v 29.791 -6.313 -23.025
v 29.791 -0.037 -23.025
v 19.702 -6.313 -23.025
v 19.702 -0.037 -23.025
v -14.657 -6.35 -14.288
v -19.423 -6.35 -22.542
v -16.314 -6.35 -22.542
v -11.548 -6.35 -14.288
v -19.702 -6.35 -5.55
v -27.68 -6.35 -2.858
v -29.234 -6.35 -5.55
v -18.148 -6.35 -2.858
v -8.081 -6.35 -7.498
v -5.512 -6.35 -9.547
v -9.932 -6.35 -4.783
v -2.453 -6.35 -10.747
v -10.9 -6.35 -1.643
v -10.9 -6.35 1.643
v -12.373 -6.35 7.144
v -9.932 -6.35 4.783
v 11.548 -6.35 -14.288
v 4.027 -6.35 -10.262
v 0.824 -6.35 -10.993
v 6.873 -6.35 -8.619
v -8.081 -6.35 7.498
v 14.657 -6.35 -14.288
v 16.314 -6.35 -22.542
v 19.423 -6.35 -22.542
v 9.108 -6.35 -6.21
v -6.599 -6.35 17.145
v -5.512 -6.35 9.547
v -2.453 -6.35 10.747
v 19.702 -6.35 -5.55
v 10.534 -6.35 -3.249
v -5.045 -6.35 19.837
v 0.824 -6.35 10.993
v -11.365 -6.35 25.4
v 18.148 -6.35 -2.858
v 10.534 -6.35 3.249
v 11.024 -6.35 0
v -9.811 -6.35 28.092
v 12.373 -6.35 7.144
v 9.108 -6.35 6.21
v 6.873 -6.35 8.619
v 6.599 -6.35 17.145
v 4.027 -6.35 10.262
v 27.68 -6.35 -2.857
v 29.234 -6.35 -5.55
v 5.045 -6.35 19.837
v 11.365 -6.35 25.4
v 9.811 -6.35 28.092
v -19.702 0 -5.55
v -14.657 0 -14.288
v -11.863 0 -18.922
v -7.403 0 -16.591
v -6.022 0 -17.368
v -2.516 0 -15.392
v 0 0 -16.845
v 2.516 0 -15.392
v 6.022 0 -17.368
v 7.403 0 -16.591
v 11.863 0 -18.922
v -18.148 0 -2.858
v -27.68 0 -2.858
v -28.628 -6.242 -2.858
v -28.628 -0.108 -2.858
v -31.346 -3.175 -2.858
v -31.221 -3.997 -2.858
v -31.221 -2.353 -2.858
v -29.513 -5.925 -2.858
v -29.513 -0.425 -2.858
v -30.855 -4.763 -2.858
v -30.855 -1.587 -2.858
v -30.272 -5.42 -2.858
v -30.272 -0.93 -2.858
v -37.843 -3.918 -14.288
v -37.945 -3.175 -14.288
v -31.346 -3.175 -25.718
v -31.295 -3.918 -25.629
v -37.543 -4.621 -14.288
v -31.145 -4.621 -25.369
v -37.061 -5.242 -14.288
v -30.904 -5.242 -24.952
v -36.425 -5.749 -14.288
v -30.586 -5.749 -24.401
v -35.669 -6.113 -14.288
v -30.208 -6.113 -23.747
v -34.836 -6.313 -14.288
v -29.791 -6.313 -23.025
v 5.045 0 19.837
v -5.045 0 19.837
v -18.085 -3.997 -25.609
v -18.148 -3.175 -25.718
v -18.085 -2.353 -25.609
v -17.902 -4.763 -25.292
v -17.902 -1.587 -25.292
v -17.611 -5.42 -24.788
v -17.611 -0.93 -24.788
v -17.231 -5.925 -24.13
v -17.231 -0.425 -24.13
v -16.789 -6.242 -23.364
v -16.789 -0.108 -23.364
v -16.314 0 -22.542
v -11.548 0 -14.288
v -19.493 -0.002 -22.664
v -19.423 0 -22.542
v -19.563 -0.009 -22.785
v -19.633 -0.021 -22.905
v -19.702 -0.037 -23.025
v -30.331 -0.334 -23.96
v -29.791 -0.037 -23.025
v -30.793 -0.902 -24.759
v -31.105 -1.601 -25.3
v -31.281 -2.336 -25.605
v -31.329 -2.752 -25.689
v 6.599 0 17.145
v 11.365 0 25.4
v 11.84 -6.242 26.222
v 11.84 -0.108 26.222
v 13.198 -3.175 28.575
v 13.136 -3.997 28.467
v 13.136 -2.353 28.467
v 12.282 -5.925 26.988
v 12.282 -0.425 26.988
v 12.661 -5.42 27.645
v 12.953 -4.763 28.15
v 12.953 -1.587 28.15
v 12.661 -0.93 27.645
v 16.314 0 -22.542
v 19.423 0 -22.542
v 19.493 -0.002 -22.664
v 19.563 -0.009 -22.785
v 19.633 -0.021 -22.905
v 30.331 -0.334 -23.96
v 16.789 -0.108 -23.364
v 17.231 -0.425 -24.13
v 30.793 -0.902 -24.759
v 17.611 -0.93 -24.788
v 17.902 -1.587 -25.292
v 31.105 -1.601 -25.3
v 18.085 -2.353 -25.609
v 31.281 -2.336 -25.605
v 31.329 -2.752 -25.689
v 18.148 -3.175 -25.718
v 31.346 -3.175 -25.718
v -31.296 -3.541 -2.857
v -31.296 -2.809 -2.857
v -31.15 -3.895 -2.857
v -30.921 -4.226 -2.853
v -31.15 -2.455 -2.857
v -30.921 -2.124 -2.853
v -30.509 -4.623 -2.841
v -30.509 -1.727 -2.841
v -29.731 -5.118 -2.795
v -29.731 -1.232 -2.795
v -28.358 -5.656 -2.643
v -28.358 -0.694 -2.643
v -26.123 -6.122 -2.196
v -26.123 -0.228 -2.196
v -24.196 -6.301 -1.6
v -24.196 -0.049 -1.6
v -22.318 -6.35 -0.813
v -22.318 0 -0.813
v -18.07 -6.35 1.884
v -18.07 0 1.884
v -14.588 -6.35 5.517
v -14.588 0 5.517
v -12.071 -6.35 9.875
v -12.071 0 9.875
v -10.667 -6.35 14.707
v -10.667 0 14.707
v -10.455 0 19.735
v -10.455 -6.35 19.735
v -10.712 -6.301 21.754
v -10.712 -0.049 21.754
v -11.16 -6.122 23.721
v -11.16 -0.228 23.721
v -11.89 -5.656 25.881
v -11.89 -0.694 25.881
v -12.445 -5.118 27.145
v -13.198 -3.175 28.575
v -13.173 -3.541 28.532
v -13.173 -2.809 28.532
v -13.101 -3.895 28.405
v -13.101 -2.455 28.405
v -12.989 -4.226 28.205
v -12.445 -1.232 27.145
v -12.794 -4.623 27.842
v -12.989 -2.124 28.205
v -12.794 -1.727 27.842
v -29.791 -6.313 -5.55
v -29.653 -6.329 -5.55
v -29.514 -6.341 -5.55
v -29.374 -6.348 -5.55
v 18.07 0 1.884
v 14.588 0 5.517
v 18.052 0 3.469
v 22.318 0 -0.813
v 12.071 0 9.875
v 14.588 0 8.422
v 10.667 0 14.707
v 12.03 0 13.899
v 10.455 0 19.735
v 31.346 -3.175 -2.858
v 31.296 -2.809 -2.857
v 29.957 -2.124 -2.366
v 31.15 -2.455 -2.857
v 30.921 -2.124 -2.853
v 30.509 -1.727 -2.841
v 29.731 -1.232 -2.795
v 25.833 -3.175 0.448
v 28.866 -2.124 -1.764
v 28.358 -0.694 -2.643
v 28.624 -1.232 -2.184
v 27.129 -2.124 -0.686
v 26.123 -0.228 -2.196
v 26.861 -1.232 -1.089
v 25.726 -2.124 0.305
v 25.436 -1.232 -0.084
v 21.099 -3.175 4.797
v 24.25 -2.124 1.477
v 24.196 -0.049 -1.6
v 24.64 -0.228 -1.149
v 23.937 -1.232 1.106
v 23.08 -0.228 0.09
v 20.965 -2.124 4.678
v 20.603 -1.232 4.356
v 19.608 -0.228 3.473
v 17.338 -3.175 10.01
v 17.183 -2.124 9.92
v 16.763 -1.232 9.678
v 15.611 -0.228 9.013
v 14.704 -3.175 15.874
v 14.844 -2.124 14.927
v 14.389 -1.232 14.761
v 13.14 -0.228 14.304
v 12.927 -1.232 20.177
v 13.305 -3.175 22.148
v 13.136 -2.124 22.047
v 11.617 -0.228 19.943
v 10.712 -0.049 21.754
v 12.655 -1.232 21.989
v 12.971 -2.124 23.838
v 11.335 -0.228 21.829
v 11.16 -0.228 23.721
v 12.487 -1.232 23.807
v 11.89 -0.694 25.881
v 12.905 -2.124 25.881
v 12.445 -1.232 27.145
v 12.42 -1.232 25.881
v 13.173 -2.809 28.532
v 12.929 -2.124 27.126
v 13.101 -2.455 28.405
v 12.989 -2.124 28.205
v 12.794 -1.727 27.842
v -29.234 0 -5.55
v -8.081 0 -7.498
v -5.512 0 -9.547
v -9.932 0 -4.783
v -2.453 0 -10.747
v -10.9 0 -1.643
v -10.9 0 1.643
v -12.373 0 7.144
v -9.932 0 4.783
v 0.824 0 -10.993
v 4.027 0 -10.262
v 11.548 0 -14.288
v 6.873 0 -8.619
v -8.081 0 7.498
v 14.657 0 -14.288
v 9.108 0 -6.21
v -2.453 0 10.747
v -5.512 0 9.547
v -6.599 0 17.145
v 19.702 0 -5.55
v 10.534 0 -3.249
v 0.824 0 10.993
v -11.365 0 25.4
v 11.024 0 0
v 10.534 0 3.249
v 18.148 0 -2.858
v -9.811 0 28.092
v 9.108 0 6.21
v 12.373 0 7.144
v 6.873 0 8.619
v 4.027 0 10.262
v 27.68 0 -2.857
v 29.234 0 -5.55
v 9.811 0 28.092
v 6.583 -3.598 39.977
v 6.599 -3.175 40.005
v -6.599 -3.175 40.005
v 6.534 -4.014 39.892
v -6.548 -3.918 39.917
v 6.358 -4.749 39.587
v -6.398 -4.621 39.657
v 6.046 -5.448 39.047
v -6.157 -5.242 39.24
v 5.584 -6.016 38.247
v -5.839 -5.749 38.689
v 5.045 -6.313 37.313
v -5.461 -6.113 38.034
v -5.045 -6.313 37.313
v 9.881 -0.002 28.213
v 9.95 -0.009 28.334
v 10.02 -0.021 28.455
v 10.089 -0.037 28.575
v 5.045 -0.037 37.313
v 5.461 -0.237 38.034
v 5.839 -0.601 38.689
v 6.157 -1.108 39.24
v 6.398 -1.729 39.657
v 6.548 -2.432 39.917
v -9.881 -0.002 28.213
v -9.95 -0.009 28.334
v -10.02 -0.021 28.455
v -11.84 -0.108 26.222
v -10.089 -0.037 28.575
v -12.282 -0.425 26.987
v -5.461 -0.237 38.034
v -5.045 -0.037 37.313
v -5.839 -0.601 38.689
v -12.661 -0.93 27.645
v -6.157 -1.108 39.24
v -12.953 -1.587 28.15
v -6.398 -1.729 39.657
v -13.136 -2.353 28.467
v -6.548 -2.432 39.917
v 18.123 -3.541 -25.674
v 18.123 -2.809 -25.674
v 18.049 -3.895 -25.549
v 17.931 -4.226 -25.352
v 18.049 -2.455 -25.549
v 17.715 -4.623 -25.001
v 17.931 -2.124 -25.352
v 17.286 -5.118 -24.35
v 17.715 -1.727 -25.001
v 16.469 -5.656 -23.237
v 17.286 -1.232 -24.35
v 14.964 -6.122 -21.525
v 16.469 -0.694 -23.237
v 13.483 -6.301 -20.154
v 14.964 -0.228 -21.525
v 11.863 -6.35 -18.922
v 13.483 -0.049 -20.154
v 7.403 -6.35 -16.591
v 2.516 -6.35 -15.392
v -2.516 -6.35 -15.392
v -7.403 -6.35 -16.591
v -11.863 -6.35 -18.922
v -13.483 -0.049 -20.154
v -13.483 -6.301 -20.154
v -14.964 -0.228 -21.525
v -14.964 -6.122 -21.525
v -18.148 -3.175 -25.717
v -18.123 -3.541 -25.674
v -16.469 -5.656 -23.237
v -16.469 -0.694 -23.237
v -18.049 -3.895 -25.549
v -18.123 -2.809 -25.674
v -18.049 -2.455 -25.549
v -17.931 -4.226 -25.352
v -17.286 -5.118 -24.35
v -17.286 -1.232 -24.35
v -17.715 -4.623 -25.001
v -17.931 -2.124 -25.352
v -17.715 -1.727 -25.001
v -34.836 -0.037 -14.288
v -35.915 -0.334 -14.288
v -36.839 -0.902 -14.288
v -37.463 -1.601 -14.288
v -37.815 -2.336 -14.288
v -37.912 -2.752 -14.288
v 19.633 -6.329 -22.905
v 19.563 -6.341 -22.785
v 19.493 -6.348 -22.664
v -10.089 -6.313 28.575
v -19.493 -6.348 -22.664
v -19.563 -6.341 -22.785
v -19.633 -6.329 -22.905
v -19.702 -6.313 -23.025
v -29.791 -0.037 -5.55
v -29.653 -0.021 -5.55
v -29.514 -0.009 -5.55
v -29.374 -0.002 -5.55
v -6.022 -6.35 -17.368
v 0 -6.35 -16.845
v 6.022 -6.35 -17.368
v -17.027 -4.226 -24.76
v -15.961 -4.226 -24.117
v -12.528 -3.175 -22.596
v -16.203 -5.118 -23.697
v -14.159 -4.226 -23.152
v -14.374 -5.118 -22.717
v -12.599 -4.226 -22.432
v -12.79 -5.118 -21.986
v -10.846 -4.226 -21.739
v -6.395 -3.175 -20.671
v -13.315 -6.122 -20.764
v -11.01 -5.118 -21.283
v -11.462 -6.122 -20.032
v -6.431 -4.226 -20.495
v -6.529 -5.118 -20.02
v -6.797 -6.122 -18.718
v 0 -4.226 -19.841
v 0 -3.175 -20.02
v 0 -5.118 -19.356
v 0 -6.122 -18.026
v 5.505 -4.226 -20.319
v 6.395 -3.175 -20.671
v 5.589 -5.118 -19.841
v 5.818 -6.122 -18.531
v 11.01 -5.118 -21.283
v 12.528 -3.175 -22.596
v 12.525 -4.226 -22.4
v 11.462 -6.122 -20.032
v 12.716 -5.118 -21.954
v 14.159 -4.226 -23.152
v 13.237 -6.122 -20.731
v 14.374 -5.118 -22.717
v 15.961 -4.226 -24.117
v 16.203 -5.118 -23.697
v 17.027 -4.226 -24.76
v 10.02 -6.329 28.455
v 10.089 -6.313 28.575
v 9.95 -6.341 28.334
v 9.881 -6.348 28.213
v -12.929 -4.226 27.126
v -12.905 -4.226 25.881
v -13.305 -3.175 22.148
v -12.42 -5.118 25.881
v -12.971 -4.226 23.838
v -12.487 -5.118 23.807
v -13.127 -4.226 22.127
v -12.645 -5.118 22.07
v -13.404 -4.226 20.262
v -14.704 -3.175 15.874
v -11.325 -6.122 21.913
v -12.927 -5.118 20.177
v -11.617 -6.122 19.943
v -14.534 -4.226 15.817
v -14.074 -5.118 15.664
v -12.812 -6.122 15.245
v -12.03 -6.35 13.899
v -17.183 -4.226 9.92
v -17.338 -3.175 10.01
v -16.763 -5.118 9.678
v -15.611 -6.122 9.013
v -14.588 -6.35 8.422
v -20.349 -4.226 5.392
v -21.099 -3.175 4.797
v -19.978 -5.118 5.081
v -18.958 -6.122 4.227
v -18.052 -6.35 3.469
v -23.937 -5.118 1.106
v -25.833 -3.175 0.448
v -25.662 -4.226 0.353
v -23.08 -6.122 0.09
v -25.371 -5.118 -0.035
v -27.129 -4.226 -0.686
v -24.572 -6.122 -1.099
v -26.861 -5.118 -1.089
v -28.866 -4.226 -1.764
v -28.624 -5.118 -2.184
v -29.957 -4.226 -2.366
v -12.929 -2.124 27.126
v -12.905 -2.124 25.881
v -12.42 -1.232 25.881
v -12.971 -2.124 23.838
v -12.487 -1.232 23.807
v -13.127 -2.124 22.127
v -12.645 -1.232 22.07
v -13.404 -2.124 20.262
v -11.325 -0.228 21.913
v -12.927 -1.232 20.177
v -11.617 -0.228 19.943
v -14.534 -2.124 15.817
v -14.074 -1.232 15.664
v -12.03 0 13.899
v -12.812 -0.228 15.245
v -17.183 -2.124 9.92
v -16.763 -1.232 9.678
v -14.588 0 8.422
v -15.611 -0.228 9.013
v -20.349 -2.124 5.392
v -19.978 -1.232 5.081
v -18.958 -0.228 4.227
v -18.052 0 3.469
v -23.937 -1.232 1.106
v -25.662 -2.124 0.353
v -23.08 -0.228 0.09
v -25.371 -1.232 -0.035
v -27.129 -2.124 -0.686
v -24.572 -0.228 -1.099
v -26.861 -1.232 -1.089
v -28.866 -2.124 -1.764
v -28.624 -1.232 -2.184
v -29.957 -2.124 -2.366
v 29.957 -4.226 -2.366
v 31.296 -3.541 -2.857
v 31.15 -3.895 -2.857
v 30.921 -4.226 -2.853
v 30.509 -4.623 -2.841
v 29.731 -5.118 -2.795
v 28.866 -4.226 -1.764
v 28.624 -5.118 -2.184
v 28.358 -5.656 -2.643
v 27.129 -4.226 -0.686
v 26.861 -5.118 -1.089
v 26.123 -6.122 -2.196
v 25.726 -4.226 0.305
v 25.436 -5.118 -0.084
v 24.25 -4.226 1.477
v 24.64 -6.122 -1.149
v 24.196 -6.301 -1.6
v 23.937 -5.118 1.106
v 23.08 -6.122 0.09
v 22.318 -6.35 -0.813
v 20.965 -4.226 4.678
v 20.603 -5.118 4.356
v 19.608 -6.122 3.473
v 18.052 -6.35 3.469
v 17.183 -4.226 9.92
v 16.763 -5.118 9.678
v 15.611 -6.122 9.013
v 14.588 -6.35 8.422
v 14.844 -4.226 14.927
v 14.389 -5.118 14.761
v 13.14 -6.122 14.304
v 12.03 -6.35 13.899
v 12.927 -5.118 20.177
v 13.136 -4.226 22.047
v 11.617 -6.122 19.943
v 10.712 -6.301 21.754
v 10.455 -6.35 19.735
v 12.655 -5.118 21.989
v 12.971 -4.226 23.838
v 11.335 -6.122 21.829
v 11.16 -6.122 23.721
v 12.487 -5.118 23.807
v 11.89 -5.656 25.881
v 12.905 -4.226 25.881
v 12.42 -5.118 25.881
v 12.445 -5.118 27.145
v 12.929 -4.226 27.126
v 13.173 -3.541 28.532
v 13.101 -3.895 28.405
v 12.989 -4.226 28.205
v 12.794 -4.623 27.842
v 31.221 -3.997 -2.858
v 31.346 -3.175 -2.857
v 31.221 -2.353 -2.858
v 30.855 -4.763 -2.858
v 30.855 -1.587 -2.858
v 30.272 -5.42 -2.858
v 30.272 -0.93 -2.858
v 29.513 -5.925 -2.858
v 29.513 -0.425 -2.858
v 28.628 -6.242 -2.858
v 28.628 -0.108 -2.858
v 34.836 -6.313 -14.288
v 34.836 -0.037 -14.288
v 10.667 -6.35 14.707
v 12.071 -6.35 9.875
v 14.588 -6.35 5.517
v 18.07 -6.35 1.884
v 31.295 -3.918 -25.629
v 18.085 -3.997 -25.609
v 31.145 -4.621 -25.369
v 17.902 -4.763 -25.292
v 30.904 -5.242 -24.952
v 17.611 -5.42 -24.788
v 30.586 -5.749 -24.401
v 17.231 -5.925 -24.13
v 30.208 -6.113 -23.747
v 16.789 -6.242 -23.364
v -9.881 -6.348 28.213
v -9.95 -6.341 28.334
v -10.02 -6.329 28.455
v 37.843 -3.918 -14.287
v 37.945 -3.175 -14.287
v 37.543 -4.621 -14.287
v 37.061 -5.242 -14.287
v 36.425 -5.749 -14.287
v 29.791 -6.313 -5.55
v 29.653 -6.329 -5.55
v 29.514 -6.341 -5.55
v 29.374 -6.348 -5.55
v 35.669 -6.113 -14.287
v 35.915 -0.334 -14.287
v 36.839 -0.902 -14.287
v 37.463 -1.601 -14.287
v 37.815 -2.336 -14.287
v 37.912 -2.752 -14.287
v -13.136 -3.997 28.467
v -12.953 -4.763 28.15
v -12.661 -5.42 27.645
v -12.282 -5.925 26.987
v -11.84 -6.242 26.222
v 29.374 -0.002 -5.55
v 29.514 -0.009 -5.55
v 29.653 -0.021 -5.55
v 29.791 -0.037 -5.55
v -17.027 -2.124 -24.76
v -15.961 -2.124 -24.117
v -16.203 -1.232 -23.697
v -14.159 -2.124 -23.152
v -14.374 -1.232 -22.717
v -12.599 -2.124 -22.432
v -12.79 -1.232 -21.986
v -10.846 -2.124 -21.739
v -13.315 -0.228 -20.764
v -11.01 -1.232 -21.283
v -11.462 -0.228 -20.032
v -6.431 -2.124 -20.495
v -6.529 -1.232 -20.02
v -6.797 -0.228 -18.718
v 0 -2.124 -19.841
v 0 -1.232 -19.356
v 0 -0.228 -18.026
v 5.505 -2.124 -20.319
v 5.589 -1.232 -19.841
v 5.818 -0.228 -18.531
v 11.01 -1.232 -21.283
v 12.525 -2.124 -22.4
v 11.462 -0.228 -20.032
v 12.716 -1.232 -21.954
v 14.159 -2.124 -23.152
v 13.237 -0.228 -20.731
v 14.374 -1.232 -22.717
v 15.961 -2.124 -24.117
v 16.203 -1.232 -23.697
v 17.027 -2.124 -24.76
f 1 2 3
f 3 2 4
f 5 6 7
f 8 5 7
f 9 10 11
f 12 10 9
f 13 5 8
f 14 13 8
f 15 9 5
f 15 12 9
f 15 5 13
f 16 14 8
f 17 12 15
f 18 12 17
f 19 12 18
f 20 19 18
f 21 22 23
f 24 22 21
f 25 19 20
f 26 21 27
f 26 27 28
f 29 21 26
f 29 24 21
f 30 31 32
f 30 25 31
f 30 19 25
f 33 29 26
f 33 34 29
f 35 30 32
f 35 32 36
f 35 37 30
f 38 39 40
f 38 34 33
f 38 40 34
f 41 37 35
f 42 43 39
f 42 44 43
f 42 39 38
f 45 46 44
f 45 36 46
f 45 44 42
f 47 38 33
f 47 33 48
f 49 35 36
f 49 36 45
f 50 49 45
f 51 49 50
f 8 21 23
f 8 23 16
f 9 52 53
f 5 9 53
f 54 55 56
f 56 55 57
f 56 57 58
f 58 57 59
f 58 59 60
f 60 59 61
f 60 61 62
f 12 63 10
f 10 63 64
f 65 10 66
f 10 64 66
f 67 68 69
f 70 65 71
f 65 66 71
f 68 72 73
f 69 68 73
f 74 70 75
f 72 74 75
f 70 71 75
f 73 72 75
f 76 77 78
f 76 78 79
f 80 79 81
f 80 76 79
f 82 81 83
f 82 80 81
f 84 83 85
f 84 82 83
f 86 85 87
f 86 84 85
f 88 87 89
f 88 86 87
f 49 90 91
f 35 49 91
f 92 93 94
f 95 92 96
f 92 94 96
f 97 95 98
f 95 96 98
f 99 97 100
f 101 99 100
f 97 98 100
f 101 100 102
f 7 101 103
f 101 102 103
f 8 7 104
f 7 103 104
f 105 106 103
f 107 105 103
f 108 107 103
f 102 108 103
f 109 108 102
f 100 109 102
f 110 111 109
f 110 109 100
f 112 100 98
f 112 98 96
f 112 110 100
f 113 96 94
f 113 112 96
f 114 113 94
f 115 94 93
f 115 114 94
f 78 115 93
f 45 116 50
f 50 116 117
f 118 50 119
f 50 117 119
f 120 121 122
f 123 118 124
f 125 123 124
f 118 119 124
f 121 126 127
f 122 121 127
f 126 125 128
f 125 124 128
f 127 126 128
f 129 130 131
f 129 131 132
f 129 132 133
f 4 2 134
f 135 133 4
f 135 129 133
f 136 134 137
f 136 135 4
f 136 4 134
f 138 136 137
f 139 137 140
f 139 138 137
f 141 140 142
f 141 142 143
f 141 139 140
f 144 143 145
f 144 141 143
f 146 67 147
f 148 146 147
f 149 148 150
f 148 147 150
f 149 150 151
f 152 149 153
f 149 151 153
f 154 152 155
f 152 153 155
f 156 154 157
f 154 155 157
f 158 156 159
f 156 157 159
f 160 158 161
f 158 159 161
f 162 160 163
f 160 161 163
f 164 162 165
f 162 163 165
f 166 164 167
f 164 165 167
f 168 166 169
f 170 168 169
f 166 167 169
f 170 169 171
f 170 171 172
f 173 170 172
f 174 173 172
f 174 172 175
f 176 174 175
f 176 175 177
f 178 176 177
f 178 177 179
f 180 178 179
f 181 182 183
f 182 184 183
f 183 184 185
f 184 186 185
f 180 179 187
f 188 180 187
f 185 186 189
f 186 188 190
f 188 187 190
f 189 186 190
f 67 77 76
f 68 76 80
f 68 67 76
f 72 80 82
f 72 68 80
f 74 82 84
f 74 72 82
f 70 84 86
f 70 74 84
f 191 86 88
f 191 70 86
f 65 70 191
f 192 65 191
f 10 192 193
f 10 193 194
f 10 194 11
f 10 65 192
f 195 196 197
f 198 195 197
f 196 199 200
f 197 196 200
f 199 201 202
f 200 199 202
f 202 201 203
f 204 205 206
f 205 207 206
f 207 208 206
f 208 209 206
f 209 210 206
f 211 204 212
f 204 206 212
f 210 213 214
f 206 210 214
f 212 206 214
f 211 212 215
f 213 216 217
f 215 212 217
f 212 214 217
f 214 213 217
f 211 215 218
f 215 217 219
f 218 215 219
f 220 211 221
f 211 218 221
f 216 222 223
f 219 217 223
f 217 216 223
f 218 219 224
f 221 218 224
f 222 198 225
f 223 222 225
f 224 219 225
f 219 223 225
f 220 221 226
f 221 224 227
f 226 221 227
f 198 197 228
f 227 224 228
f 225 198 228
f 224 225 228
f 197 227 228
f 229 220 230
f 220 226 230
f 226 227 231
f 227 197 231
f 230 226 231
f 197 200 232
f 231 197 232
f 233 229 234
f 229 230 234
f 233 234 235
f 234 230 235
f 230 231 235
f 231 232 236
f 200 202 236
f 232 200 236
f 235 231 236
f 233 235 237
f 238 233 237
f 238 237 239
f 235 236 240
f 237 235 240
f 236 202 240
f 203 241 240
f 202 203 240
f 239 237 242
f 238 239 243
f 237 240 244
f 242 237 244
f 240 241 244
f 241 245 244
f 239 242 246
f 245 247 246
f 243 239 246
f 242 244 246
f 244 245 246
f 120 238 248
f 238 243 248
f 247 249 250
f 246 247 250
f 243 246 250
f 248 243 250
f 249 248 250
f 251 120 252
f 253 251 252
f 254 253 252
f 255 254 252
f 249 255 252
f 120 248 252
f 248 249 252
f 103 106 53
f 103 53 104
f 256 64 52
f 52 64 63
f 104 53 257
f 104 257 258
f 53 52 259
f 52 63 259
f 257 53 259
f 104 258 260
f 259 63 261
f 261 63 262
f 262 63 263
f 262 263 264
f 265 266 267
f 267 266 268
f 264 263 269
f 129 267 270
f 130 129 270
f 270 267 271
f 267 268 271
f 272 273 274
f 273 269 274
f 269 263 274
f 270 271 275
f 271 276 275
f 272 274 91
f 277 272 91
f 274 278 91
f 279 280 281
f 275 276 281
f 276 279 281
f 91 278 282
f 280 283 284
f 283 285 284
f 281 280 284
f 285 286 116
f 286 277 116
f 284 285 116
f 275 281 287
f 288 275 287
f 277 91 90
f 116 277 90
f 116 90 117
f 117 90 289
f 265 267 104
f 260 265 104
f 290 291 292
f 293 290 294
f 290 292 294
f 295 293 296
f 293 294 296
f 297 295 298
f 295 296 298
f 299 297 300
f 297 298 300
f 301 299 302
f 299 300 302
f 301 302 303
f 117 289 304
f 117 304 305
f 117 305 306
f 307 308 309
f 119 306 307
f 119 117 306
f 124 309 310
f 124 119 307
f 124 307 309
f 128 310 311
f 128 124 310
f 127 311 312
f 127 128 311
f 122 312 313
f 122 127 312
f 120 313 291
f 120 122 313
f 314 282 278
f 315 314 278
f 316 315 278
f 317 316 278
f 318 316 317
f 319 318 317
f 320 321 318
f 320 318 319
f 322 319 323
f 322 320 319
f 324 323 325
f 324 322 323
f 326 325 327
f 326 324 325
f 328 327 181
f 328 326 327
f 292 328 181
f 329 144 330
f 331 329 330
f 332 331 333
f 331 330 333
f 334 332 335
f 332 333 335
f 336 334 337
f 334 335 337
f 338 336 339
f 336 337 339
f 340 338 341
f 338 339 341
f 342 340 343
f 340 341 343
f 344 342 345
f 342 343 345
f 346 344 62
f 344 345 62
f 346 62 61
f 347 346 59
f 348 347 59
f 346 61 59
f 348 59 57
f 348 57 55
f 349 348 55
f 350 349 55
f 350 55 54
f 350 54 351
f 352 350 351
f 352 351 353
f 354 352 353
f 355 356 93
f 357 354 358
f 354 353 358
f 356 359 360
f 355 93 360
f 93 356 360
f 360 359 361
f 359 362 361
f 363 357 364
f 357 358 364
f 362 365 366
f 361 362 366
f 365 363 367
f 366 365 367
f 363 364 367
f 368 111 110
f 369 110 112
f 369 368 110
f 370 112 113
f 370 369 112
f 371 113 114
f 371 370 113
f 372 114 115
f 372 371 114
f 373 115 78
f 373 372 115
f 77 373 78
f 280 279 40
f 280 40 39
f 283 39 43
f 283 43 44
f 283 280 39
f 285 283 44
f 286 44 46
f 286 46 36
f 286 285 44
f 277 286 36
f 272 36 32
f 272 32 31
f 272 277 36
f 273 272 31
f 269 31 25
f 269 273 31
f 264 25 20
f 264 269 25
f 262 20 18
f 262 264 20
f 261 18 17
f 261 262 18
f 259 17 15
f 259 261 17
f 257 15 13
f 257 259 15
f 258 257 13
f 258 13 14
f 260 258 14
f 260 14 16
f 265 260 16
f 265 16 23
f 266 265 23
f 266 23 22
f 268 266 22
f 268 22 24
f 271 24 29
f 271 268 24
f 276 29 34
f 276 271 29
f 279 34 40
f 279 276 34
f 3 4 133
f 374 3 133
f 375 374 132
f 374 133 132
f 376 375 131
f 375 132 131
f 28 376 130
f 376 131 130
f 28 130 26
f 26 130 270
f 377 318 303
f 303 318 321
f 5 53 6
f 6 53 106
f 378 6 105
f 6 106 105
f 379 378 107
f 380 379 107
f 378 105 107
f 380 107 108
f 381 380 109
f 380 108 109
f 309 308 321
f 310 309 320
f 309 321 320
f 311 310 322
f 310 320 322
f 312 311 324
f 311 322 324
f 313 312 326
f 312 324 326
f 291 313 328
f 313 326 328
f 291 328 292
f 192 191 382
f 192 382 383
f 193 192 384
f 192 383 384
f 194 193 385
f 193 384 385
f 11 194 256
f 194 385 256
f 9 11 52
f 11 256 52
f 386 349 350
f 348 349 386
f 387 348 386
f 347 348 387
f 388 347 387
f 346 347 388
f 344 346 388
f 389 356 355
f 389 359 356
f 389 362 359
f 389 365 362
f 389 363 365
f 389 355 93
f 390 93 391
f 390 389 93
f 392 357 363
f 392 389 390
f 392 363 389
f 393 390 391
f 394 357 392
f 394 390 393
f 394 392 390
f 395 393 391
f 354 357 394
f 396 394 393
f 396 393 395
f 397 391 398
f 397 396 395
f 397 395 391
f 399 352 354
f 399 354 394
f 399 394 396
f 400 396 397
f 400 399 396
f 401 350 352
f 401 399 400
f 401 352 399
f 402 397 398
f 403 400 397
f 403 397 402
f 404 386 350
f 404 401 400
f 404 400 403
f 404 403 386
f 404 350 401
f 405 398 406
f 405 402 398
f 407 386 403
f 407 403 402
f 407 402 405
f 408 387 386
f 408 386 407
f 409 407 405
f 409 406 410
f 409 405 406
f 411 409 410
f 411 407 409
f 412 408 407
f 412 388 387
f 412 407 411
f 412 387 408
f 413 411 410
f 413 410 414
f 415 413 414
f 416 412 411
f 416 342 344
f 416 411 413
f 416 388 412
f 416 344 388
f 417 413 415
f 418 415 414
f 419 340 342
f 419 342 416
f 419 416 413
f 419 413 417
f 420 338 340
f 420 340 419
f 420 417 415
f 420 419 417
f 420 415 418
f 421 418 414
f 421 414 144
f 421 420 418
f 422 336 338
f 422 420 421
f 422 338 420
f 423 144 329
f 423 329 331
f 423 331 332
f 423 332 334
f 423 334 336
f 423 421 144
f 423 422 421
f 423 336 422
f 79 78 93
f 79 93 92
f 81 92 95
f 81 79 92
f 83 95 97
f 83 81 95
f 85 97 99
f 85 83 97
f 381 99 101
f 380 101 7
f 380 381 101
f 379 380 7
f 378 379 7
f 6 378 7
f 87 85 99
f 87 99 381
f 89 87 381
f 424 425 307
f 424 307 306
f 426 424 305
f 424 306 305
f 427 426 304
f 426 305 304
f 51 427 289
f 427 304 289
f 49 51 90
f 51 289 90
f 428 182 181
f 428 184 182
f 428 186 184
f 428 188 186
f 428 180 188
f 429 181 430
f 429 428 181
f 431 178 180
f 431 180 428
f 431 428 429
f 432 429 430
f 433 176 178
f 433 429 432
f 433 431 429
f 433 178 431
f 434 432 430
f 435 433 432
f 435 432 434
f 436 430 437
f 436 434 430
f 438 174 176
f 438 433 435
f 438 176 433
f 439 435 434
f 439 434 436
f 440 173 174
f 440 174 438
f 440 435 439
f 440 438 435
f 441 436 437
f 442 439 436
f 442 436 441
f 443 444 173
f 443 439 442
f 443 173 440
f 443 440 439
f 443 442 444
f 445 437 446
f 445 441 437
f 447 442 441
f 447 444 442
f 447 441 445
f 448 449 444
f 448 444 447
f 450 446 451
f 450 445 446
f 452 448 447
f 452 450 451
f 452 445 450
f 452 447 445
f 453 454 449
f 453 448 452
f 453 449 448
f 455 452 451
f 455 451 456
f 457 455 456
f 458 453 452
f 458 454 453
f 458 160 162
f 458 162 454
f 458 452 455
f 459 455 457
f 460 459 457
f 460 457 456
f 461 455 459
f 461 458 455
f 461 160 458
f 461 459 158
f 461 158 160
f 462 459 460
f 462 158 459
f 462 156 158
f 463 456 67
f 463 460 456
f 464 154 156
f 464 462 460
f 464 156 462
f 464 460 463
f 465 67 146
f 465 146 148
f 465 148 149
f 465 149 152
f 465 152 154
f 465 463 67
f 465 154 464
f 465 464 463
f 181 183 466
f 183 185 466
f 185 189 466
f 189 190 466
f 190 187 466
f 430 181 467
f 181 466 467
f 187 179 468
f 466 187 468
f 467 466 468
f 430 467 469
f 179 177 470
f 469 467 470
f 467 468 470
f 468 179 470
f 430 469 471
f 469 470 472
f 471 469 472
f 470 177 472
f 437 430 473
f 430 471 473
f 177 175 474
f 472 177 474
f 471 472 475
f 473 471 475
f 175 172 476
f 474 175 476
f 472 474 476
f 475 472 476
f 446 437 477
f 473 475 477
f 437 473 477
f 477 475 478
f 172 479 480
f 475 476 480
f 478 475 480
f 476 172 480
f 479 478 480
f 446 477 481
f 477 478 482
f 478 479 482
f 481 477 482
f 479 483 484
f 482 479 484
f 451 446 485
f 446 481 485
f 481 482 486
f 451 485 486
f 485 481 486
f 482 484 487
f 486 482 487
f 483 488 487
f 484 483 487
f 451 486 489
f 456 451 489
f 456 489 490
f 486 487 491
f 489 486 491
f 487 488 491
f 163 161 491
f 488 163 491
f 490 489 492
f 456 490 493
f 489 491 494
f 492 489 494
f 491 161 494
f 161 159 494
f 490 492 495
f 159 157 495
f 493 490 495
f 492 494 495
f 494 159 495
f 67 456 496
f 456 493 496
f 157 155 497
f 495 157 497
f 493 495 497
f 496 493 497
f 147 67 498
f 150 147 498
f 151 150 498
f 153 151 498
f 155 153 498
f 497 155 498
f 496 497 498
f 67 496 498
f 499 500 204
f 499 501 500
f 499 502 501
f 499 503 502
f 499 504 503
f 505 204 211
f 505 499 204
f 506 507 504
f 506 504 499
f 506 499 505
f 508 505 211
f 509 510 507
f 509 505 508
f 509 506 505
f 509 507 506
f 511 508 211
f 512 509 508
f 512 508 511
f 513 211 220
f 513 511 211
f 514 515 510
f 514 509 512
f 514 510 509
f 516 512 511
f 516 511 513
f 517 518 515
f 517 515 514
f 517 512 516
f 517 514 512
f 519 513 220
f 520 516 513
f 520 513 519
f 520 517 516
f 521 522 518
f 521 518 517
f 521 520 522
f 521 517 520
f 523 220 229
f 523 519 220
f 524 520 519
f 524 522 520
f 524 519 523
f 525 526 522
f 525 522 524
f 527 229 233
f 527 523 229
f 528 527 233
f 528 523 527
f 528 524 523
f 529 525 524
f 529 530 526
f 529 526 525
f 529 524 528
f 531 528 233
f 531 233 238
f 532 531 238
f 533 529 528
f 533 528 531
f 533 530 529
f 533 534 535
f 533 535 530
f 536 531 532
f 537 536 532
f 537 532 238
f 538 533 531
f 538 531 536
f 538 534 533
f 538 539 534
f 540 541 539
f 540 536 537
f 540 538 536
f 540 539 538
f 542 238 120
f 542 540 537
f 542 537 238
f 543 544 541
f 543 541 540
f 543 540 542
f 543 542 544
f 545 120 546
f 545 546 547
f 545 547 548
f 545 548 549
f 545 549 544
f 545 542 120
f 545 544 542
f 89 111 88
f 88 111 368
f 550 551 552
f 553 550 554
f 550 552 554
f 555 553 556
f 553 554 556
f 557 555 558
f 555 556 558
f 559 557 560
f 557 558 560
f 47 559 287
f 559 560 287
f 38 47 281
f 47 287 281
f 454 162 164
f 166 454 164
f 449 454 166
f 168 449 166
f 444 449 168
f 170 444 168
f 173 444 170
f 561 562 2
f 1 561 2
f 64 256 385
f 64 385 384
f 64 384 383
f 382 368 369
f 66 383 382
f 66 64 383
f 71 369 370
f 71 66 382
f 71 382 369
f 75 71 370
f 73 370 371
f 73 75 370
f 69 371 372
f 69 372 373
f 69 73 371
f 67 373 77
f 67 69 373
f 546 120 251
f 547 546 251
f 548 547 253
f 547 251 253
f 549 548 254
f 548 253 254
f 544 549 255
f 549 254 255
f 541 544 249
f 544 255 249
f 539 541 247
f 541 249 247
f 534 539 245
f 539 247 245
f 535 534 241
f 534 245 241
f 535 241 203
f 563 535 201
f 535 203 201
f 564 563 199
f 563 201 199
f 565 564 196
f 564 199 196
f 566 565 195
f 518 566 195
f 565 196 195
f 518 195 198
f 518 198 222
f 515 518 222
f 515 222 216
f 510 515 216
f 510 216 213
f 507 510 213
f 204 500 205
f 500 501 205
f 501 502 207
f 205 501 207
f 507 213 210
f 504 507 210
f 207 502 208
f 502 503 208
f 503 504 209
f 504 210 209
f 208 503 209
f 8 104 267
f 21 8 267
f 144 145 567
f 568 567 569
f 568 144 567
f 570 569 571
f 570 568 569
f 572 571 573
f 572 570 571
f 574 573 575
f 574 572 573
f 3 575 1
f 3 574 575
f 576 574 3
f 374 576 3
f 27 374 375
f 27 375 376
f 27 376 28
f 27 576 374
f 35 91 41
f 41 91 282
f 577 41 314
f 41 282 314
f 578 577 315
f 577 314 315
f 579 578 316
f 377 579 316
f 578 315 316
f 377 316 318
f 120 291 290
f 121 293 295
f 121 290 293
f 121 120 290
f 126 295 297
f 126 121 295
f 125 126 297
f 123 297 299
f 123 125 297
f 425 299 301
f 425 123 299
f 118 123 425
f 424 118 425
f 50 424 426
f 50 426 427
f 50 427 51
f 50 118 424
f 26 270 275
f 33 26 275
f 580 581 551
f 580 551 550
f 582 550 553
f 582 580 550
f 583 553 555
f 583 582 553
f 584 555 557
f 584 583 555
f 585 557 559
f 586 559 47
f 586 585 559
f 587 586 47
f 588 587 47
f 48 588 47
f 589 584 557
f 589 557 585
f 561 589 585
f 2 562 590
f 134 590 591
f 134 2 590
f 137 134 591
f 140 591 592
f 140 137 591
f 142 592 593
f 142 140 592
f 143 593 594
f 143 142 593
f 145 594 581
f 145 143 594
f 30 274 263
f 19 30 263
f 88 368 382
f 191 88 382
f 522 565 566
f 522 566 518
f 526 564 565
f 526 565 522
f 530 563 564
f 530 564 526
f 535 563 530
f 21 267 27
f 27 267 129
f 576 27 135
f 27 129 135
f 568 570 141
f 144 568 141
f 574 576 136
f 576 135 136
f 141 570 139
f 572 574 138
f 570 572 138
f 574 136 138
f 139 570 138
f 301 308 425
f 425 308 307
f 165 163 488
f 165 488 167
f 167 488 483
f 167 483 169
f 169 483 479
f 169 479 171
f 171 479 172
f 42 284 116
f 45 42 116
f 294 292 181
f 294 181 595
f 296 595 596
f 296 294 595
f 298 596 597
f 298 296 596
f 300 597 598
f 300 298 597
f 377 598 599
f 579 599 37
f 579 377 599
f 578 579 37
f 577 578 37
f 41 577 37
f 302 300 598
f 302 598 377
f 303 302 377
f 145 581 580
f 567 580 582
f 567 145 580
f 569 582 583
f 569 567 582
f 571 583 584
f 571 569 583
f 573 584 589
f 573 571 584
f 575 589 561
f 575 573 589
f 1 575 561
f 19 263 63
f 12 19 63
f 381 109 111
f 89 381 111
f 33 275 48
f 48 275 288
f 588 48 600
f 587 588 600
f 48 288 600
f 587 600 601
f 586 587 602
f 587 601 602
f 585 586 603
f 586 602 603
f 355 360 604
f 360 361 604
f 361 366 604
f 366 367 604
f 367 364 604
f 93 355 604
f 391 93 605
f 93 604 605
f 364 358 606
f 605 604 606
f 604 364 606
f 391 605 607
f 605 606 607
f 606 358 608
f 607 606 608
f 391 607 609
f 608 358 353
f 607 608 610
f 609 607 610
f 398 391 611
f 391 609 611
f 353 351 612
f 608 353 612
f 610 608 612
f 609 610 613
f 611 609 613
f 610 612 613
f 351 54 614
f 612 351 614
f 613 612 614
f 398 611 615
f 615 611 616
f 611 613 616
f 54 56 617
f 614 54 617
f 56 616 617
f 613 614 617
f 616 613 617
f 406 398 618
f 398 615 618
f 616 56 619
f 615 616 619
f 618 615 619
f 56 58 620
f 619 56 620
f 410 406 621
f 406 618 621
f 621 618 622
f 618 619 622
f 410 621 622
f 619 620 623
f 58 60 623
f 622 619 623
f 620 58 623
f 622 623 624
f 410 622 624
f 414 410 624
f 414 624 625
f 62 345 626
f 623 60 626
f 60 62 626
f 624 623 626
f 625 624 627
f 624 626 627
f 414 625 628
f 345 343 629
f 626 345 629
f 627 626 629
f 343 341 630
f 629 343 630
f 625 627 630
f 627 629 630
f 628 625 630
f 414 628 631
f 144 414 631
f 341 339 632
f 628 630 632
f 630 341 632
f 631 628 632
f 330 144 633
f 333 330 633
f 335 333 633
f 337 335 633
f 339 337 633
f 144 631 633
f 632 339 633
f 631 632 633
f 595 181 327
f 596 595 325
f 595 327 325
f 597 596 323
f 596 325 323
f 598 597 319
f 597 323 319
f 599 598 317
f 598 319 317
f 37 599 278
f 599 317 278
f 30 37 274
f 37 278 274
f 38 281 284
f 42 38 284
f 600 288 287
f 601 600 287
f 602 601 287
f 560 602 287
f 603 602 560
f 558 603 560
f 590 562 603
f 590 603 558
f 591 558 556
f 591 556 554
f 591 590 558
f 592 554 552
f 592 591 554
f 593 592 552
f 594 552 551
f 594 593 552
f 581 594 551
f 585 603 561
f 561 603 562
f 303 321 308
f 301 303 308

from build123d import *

# Parameters (mm, degrees)
F1_DEPTH      = 6.35
F0_R          = 11.0236
F2_T1_DEPTH   = 29.0732271537
F2_T3_DEPTH   = 29.0732271537
F2_T5_DEPTH   = 29.0732271537
F2_T7_DEPTH   = 29.0732271537
F2_T9_DEPTH   = 29.0732271537
F2_T11_DEPTH  = 29.0732271537
F2_T13_DEPTH  = 29.0732271537
F2_T15_DEPTH  = 29.0732271537
F2_T17_DEPTH  = 29.0732271537
F2_2_T2_ANGLE = 98.3752988321
F2_3_T2_ANGLE = 98.3752988321
F2_4_T2_ANGLE = 98.3752988321
F3_T1_DEPTH   = 29.0732271537
F3_T3_DEPTH   = 29.0732271537
F3_T5_DEPTH   = 29.0732271537
F3_T7_DEPTH   = 29.0732271537
F3_T9_DEPTH   = 29.0732271537
F3_T11_DEPTH  = 29.0732271537
F3_T13_DEPTH  = 29.0732271537
F3_T15_DEPTH  = 29.0732271537
F3_T17_DEPTH  = 29.0732271537
F3_2_T2_ANGLE = 98.3752988321
F3_3_T2_ANGLE = 98.3752988321
F3_4_T2_ANGLE = 98.3752988321


# Not quite as in the source:
# - a fillet or chamfer that OpenCascade refuses, or shapes differently, is made with other operations: its cross-section is extruded or revolved along the edge and cut away or added


with BuildPart() as f1:
    # F0 (on Front) → F1 (new body)
    with BuildSketch(Plane.XZ):
        with BuildLine():
            ThreePointArc((-31.34578949, -2.8575), (-13.1982271537, 7.62), (-13.1982271537, 28.575))
            ThreePointArc((-13.1982271537, 28.575), (-17.3377575298, 10.009958977), (-31.34578949, -2.8575))
        make_face()
    extrude(amount=F1_DEPTH)

    # F2#2: fillet of radius 3.175 on 1 edges, made by hand

    # F2_2_s1 → F2_2_t2 (revolve, cut)
    with BuildSketch(Plane(origin=(-12.8777682078, 0, 37.0055953838), x_dir=(0, 1, 0), z_dir=(-0.3286630709, 0, 0.9444472382))):
        with BuildLine():
            ThreePointArc((-3.175, 2.0859779117), (-5.4200640303, 1.156041942), (-6.35, -1.0890220883))
            Line((-6.35, -1.0890220883), (-6.35, 2.0859779117))
            Line((-6.35, 2.0859779117), (-3.175, 2.0859779117))
        make_face()
    revolve(axis=Axis((-44.8340641, -6.35, 25.884958977), (0, 1, 0)), revolution_arc=F2_2_T2_ANGLE, mode=Mode.SUBTRACT)

    # F3#4: fillet of radius 3.175 on 1 edges, made by hand

    # F3_4_s1 → F3_4_t2 (revolve, cut)
    with BuildSketch(Plane(origin=(-12.8777682078, 0, 37.0055953838), x_dir=(0, 1, 0), z_dir=(-0.3286630709, 0, 0.9444472382))):
        with BuildLine():
            ThreePointArc((-3.175, 2.0859779117), (-0.9299359697, 1.156041942), (0, -1.0890220883))
            Line((0, -1.0890220883), (0, 2.0859779117))
            Line((0, 2.0859779117), (-3.175, 2.0859779117))
        make_face()
    revolve(axis=Axis((-44.8340641, 0, 25.884958977), (0, 1, 0)), revolution_arc=F3_4_T2_ANGLE, mode=Mode.SUBTRACT)


with BuildPart() as f1b:
    # F0 (on Front) → F1, piece 2 (new body)
    with BuildSketch(Plane.XZ):
        with BuildLine():
            ThreePointArc((13.1982271537, 28.575), (13.1982271537, 7.62), (31.34578949, -2.8575))
            ThreePointArc((31.34578949, -2.8575), (17.3377575298, 10.009958977), (13.1982271537, 28.575))
        make_face()
    extrude(amount=F1_DEPTH)

    # F2#4: fillet of radius 3.175 on 1 edges, made by hand

    # F2_4_s1 → F2_4_t2 (revolve, cut)
    with BuildSketch(Plane(origin=(38.4866697884, 0, -7.3503232799), x_dir=(0, 1, 0), z_dir=(0.9822468363, 0, -0.1875930505))):
        with BuildLine():
            ThreePointArc((-3.175, 2.0859779117), (-5.4200640303, 1.156041942), (-6.35, -1.0890220883))
            Line((-6.35, -1.0890220883), (-6.35, 2.0859779117))
            Line((-6.35, 2.0859779117), (-3.175, 2.0859779117))
        make_face()
    revolve(axis=Axis((44.8340641, -6.35, 25.884958977), (0, 1, 0)), revolution_arc=F2_4_T2_ANGLE, mode=Mode.SUBTRACT)

    # F3#2: fillet of radius 3.175 on 1 edges, made by hand

    # F3_2_s1 → F3_2_t2 (revolve, cut)
    with BuildSketch(Plane(origin=(38.4866697884, 0, -7.3503232799), x_dir=(0, 1, 0), z_dir=(0.9822468363, 0, -0.1875930505))):
        with BuildLine():
            ThreePointArc((-3.175, 2.0859779117), (-0.9299359697, 1.156041942), (0, -1.0890220883))
            Line((0, -1.0890220883), (0, 2.0859779117))
            Line((0, 2.0859779117), (-3.175, 2.0859779117))
        make_face()
    revolve(axis=Axis((44.8340641, 0, 25.884958977), (0, 1, 0)), revolution_arc=F3_2_T2_ANGLE, mode=Mode.SUBTRACT)


with BuildPart() as f1c:
    # F0 (on Front) → F1, piece 3 (new body)
    with BuildSketch(Plane.XZ):
        with BuildLine():
            ThreePointArc((18.1475623363, -25.7175), (0, -15.24), (-18.1475623363, -25.7175))
            ThreePointArc((-18.1475623363, -25.7175), (0, -20.019917954), (18.1475623363, -25.7175))
        make_face()
    extrude(amount=F1_DEPTH)

    # F2#3: fillet of radius 3.175 on 1 edges, made by hand

    # F2_3_s1 → F2_3_t2 (revolve, cut)
    with BuildSketch(Plane(origin=(-25.6089015806, 0, -29.6552721039), x_dir=(0, 1, 0), z_dir=(-0.6535837654, 0, -0.7568541878))):
        with BuildLine():
            ThreePointArc((-3.175, 2.0859779117), (-5.4200640303, 1.156041942), (-6.35, -1.0890220883))
            Line((-6.35, -1.0890220883), (-6.35, 2.0859779117))
            Line((-6.35, 2.0859779117), (-3.175, 2.0859779117))
        make_face()
    revolve(axis=Axis((0, -6.35, -51.769917954), (0, 1, 0)), revolution_arc=F2_3_T2_ANGLE, mode=Mode.SUBTRACT)

    # F3#3: fillet of radius 3.175 on 1 edges, made by hand

    # F3_3_s1 → F3_3_t2 (revolve, cut)
    with BuildSketch(Plane(origin=(-25.6089015806, 0, -29.6552721039), x_dir=(0, 1, 0), z_dir=(-0.6535837654, 0, -0.7568541878))):
        with BuildLine():
            ThreePointArc((-3.175, 2.0859779117), (-0.9299359697, 1.156041942), (0, -1.0890220883))
            Line((0, -1.0890220883), (0, 2.0859779117))
            Line((0, 2.0859779117), (-3.175, 2.0859779117))
        make_face()
    revolve(axis=Axis((0, 0, -51.769917954), (0, 1, 0)), revolution_arc=F3_3_T2_ANGLE, mode=Mode.SUBTRACT)


with BuildPart() as f1d:
    # F0 (on Front) → F1, piece 4 (new body)
    with BuildSketch(Plane.XZ):
        Polygon((-6.5991135768, 17.145), (6.5991135768, 17.145), (13.1982271537, 28.575), (6.5991135768, 40.005), (-6.5991135768, 40.005), (-13.1982271537, 28.575), align=None)
        Polygon((10.0893114241, 28.575), (5.0446557121, 19.8374), (-5.0446557121, 19.8374), (-10.0893114241, 28.575), (-5.0446557121, 37.3126), (5.0446557121, 37.3126), align=None, mode=Mode.SUBTRACT)
        Polygon((-18.1475623363, -25.7175), (-11.5484487595, -14.2875), (-18.1475623363, -2.8575), (-31.34578949, -2.8575), (-37.9449030668, -14.2875), (-31.34578949, -25.7175), align=None)
        Polygon((-14.657364489, -14.2875), (-19.7020202011, -23.0251), (-29.7913316252, -23.0251), (-34.8359873373, -14.2875), (-29.7913316252, -5.5499), (-19.7020202011, -5.5499), align=None, mode=Mode.SUBTRACT)
        Polygon((31.34578949, -2.8575), (18.1475623363, -2.8575), (11.5484487595, -14.2875), (18.1475623363, -25.7175), (31.34578949, -25.7175), (37.9449030668, -14.2875), align=None)
        Polygon((19.7020202011, -5.5499), (29.7913316252, -5.5499), (34.8359873373, -14.2875), (29.7913316252, -23.0251), (19.7020202011, -23.0251), (14.657364489, -14.2875), align=None, mode=Mode.SUBTRACT)
        with BuildLine():
            ThreePointArc((0, -14.2875), (10.1027881362, -10.1027881362), (14.2875, 0))
            ThreePointArc((14.2875, 0), (13.8006654478, 3.6978763431), (12.3733387473, 7.1437486304))
            ThreePointArc((12.3733387473, 7.1437486304), (5.17e-08, 14.2875), (-12.3733386957, 7.1437487198))
            ThreePointArc((-12.3733386957, 7.1437487198), (-12.373337587, -7.1437506401), (0, -14.2875))
        make_face()
        Circle(F0_R, mode=Mode.SUBTRACT)
        with BuildLine():
            ThreePointArc((12.3733387473, 7.1437486304), (13.8006654478, 3.6978763431), (14.2875, 0))
            ThreePointArc((14.2875, 0), (10.1027881362, -10.1027881362), (0, -14.2875))
            Line((0, -14.2875), (11.5484487595, -14.2875))
            Line((11.5484487595, -14.2875), (18.1475623363, -2.8575))
            Line((18.1475623363, -2.8575), (12.3733387473, 7.1437486304))
        make_face()
        with BuildLine():
            Line((-11.5484487595, -14.2875), (0, -14.2875))
            ThreePointArc((0, -14.2875), (-12.373337587, -7.1437506401), (-12.3733386957, 7.1437487198))
            Line((-12.3733386957, 7.1437487198), (-18.1475623363, -2.8575))
            Line((-18.1475623363, -2.8575), (-11.5484487595, -14.2875))
        make_face()
        with BuildLine():
            ThreePointArc((-12.3733386957, 7.1437487198), (5.17e-08, 14.2875), (12.3733387473, 7.1437486304))
            Line((12.3733387473, 7.1437486304), (6.5991135768, 17.145))
            Line((6.5991135768, 17.145), (-6.5991135768, 17.145))
            Line((-6.5991135768, 17.145), (-12.3733386957, 7.1437487198))
        make_face()
    extrude(amount=F1_DEPTH)

    # F2: fillet of radius 3.175 on 9 edges, made by hand

    # F2_s2 → F2_t1 (cut)
    with BuildSketch(Plane(origin=(19.641644745, 0, 34.0203266425), x_dir=(0, 1, 0), z_dir=(-0.5, 0, -0.8660254038))):
        with BuildLine():
            ThreePointArc((-3.175, -25.7175), (-5.4200640303, -24.7875640303), (-6.35, -22.5425))
            Line((-6.35, -22.5425), (-6.35, -25.7175))
            Line((-6.35, -25.7175), (-3.175, -25.7175))
        make_face()
    extrude(amount=F2_T1_DEPTH, mode=Mode.SUBTRACT)

    # F2_s4 → F2_t3 (cut)
    with BuildSketch(Plane.YZ.offset(-14.5366135768)):
        with BuildLine():
            ThreePointArc((-3.175, 40.005), (-5.4200640303, 39.0750640303), (-6.35, 36.83))
            Line((-6.35, 36.83), (-6.35, 40.005))
            Line((-6.35, 40.005), (-3.175, 40.005))
        make_face()
    extrude(amount=F2_T3_DEPTH, mode=Mode.SUBTRACT)

    # F2_s6 → F2_t5 (cut)
    with BuildSketch(Plane(origin=(-5.1050311682, 0, 8.8421733575), x_dir=(0, 1, 0), z_dir=(-0.5, 0, 0.8660254038))):
        with BuildLine():
            ThreePointArc((-3.175, -25.7175), (-5.4200640303, -24.7875640303), (-6.35, -22.5425))
            Line((-6.35, -22.5425), (-6.35, -25.7175))
            Line((-6.35, -25.7175), (-3.175, -25.7175))
        make_face()
    extrude(amount=F2_T5_DEPTH, mode=Mode.SUBTRACT)

    # F2_s8 → F2_t7 (cut)
    with BuildSketch(Plane(origin=(-5.1050311682, 0, -8.8421733575), x_dir=(0, 1, 0), z_dir=(-0.5, 0, -0.8660254038))):
        with BuildLine():
            ThreePointArc((-3.175, -25.7175), (-5.4200640303, -24.7875640303), (-6.35, -22.5425))
            Line((-6.35, -22.5425), (-6.35, -25.7175))
            Line((-6.35, -25.7175), (-3.175, -25.7175))
        make_face()
    extrude(amount=F2_T7_DEPTH, mode=Mode.SUBTRACT)

    # F2_s10 → F2_t9 (cut)
    with BuildSketch(Plane(origin=(-7.2683067884, 0, 12.5890766425), x_dir=(0, 1, 0), z_dir=(0.5, 0, -0.8660254038))):
        with BuildLine():
            ThreePointArc((-3.175, -40.005), (-5.4200640303, -39.0750640303), (-6.35, -36.83))
            Line((-6.35, -36.83), (-6.35, -40.005))
            Line((-6.35, -40.005), (-3.175, -40.005))
        make_face()
    extrude(amount=F2_T9_DEPTH, mode=Mode.SUBTRACT)

    # F2_s12 → F2_t11 (cut)
    with BuildSketch(Plane.YZ.offset(-39.28328949)):
        with BuildLine():
            ThreePointArc((-3.175, -25.7175), (-5.4200640303, -24.7875640303), (-6.35, -22.5425))
            Line((-6.35, -22.5425), (-6.35, -25.7175))
            Line((-6.35, -25.7175), (-3.175, -25.7175))
        make_face()
    extrude(amount=F2_T11_DEPTH, mode=Mode.SUBTRACT)

    # F2_s14 → F2_t13 (cut)
    with BuildSketch(Plane.YZ.offset(10.2100623363)):
        with BuildLine():
            ThreePointArc((-3.175, -25.7175), (-5.4200640303, -24.7875640303), (-6.35, -22.5425))
            Line((-6.35, -22.5425), (-6.35, -25.7175))
            Line((-6.35, -25.7175), (-3.175, -25.7175))
        make_face()
    extrude(amount=F2_T13_DEPTH, mode=Mode.SUBTRACT)

    # F2_s16 → F2_t15 (cut)
    with BuildSketch(Plane(origin=(-7.2683067884, 0, -12.5890766425), x_dir=(0, 1, 0), z_dir=(0.5, 0, 0.8660254038))):
        with BuildLine():
            ThreePointArc((-3.175, -40.005), (-5.4200640303, -39.0750640303), (-6.35, -36.83))
            Line((-6.35, -36.83), (-6.35, -40.005))
            Line((-6.35, -40.005), (-3.175, -40.005))
        make_face()
    extrude(amount=F2_T15_DEPTH, mode=Mode.SUBTRACT)

    # F2_s18 → F2_t17 (cut)
    with BuildSketch(Plane(origin=(19.641644745, 0, -34.0203266425), x_dir=(0, 1, 0), z_dir=(-0.5, 0, 0.8660254038))):
        with BuildLine():
            ThreePointArc((-3.175, -25.7175), (-5.4200640303, -24.7875640303), (-6.35, -22.5425))
            Line((-6.35, -22.5425), (-6.35, -25.7175))
            Line((-6.35, -25.7175), (-3.175, -25.7175))
        make_face()
    extrude(amount=F2_T17_DEPTH, mode=Mode.SUBTRACT)

    # F3: fillet of radius 3.175 on 9 edges, made by hand

    # F3_s2 → F3_t1 (cut)
    with BuildSketch(Plane.YZ.offset(-14.5366135768)):
        with BuildLine():
            ThreePointArc((0, 36.83), (-0.9299359697, 39.0750640303), (-3.175, 40.005))
            Line((-3.175, 40.005), (0, 40.005))
            Line((0, 40.005), (0, 36.83))
        make_face()
    extrude(amount=F3_T1_DEPTH, mode=Mode.SUBTRACT)

    # F3_s4 → F3_t3 (cut)
    with BuildSketch(Plane(origin=(-5.1050311682, 0, 8.8421733575), x_dir=(0, 1, 0), z_dir=(-0.5, 0, 0.8660254038))):
        with BuildLine():
            ThreePointArc((0, -22.5425), (-0.9299359697, -24.7875640303), (-3.175, -25.7175))
            Line((-3.175, -25.7175), (0, -25.7175))
            Line((0, -25.7175), (0, -22.5425))
        make_face()
    extrude(amount=F3_T3_DEPTH, mode=Mode.SUBTRACT)

    # F3_s6 → F3_t5 (cut)
    with BuildSketch(Plane(origin=(19.641644745, 0, -34.0203266425), x_dir=(0, 1, 0), z_dir=(-0.5, 0, 0.8660254038))):
        with BuildLine():
            ThreePointArc((0, -22.5425), (-0.9299359697, -24.7875640303), (-3.175, -25.7175))
            Line((-3.175, -25.7175), (0, -25.7175))
            Line((0, -25.7175), (0, -22.5425))
        make_face()
    extrude(amount=F3_T5_DEPTH, mode=Mode.SUBTRACT)

    # F3_s8 → F3_t7 (cut)
    with BuildSketch(Plane(origin=(-7.2683067884, 0, -12.5890766425), x_dir=(0, 1, 0), z_dir=(0.5, 0, 0.8660254038))):
        with BuildLine():
            ThreePointArc((0, -36.83), (-0.9299359697, -39.0750640303), (-3.175, -40.005))
            Line((-3.175, -40.005), (0, -40.005))
            Line((0, -40.005), (0, -36.83))
        make_face()
    extrude(amount=F3_T7_DEPTH, mode=Mode.SUBTRACT)

    # F3_s10 → F3_t9 (cut)
    with BuildSketch(Plane.YZ.offset(10.2100623363)):
        with BuildLine():
            ThreePointArc((0, -22.5425), (-0.9299359697, -24.7875640303), (-3.175, -25.7175))
            Line((-3.175, -25.7175), (0, -25.7175))
            Line((0, -25.7175), (0, -22.5425))
        make_face()
    extrude(amount=F3_T9_DEPTH, mode=Mode.SUBTRACT)

    # F3_s12 → F3_t11 (cut)
    with BuildSketch(Plane.YZ.offset(-39.28328949)):
        with BuildLine():
            ThreePointArc((0, -22.5425), (-0.9299359697, -24.7875640303), (-3.175, -25.7175))
            Line((-3.175, -25.7175), (0, -25.7175))
            Line((0, -25.7175), (0, -22.5425))
        make_face()
    extrude(amount=F3_T11_DEPTH, mode=Mode.SUBTRACT)

    # F3_s14 → F3_t13 (cut)
    with BuildSketch(Plane(origin=(-7.2683067884, 0, 12.5890766425), x_dir=(0, 1, 0), z_dir=(0.5, 0, -0.8660254038))):
        with BuildLine():
            ThreePointArc((0, -36.83), (-0.9299359697, -39.0750640303), (-3.175, -40.005))
            Line((-3.175, -40.005), (0, -40.005))
            Line((0, -40.005), (0, -36.83))
        make_face()
    extrude(amount=F3_T13_DEPTH, mode=Mode.SUBTRACT)

    # F3_s16 → F3_t15 (cut)
    with BuildSketch(Plane(origin=(-5.1050311682, 0, -8.8421733575), x_dir=(0, 1, 0), z_dir=(-0.5, 0, -0.8660254038))):
        with BuildLine():
            ThreePointArc((0, -22.5425), (-0.9299359697, -24.7875640303), (-3.175, -25.7175))
            Line((-3.175, -25.7175), (0, -25.7175))
            Line((0, -25.7175), (0, -22.5425))
        make_face()
    extrude(amount=F3_T15_DEPTH, mode=Mode.SUBTRACT)

    # F3_s18 → F3_t17 (cut)
    with BuildSketch(Plane(origin=(19.641644745, 0, 34.0203266425), x_dir=(0, 1, 0), z_dir=(-0.5, 0, -0.8660254038))):
        with BuildLine():
            ThreePointArc((0, -22.5425), (-0.9299359697, -24.7875640303), (-3.175, -25.7175))
            Line((-3.175, -25.7175), (0, -25.7175))
            Line((0, -25.7175), (0, -22.5425))
        make_face()
    extrude(amount=F3_T17_DEPTH, mode=Mode.SUBTRACT)


solid = Compound([f1.part, f1b.part, f1c.part, f1d.part])
